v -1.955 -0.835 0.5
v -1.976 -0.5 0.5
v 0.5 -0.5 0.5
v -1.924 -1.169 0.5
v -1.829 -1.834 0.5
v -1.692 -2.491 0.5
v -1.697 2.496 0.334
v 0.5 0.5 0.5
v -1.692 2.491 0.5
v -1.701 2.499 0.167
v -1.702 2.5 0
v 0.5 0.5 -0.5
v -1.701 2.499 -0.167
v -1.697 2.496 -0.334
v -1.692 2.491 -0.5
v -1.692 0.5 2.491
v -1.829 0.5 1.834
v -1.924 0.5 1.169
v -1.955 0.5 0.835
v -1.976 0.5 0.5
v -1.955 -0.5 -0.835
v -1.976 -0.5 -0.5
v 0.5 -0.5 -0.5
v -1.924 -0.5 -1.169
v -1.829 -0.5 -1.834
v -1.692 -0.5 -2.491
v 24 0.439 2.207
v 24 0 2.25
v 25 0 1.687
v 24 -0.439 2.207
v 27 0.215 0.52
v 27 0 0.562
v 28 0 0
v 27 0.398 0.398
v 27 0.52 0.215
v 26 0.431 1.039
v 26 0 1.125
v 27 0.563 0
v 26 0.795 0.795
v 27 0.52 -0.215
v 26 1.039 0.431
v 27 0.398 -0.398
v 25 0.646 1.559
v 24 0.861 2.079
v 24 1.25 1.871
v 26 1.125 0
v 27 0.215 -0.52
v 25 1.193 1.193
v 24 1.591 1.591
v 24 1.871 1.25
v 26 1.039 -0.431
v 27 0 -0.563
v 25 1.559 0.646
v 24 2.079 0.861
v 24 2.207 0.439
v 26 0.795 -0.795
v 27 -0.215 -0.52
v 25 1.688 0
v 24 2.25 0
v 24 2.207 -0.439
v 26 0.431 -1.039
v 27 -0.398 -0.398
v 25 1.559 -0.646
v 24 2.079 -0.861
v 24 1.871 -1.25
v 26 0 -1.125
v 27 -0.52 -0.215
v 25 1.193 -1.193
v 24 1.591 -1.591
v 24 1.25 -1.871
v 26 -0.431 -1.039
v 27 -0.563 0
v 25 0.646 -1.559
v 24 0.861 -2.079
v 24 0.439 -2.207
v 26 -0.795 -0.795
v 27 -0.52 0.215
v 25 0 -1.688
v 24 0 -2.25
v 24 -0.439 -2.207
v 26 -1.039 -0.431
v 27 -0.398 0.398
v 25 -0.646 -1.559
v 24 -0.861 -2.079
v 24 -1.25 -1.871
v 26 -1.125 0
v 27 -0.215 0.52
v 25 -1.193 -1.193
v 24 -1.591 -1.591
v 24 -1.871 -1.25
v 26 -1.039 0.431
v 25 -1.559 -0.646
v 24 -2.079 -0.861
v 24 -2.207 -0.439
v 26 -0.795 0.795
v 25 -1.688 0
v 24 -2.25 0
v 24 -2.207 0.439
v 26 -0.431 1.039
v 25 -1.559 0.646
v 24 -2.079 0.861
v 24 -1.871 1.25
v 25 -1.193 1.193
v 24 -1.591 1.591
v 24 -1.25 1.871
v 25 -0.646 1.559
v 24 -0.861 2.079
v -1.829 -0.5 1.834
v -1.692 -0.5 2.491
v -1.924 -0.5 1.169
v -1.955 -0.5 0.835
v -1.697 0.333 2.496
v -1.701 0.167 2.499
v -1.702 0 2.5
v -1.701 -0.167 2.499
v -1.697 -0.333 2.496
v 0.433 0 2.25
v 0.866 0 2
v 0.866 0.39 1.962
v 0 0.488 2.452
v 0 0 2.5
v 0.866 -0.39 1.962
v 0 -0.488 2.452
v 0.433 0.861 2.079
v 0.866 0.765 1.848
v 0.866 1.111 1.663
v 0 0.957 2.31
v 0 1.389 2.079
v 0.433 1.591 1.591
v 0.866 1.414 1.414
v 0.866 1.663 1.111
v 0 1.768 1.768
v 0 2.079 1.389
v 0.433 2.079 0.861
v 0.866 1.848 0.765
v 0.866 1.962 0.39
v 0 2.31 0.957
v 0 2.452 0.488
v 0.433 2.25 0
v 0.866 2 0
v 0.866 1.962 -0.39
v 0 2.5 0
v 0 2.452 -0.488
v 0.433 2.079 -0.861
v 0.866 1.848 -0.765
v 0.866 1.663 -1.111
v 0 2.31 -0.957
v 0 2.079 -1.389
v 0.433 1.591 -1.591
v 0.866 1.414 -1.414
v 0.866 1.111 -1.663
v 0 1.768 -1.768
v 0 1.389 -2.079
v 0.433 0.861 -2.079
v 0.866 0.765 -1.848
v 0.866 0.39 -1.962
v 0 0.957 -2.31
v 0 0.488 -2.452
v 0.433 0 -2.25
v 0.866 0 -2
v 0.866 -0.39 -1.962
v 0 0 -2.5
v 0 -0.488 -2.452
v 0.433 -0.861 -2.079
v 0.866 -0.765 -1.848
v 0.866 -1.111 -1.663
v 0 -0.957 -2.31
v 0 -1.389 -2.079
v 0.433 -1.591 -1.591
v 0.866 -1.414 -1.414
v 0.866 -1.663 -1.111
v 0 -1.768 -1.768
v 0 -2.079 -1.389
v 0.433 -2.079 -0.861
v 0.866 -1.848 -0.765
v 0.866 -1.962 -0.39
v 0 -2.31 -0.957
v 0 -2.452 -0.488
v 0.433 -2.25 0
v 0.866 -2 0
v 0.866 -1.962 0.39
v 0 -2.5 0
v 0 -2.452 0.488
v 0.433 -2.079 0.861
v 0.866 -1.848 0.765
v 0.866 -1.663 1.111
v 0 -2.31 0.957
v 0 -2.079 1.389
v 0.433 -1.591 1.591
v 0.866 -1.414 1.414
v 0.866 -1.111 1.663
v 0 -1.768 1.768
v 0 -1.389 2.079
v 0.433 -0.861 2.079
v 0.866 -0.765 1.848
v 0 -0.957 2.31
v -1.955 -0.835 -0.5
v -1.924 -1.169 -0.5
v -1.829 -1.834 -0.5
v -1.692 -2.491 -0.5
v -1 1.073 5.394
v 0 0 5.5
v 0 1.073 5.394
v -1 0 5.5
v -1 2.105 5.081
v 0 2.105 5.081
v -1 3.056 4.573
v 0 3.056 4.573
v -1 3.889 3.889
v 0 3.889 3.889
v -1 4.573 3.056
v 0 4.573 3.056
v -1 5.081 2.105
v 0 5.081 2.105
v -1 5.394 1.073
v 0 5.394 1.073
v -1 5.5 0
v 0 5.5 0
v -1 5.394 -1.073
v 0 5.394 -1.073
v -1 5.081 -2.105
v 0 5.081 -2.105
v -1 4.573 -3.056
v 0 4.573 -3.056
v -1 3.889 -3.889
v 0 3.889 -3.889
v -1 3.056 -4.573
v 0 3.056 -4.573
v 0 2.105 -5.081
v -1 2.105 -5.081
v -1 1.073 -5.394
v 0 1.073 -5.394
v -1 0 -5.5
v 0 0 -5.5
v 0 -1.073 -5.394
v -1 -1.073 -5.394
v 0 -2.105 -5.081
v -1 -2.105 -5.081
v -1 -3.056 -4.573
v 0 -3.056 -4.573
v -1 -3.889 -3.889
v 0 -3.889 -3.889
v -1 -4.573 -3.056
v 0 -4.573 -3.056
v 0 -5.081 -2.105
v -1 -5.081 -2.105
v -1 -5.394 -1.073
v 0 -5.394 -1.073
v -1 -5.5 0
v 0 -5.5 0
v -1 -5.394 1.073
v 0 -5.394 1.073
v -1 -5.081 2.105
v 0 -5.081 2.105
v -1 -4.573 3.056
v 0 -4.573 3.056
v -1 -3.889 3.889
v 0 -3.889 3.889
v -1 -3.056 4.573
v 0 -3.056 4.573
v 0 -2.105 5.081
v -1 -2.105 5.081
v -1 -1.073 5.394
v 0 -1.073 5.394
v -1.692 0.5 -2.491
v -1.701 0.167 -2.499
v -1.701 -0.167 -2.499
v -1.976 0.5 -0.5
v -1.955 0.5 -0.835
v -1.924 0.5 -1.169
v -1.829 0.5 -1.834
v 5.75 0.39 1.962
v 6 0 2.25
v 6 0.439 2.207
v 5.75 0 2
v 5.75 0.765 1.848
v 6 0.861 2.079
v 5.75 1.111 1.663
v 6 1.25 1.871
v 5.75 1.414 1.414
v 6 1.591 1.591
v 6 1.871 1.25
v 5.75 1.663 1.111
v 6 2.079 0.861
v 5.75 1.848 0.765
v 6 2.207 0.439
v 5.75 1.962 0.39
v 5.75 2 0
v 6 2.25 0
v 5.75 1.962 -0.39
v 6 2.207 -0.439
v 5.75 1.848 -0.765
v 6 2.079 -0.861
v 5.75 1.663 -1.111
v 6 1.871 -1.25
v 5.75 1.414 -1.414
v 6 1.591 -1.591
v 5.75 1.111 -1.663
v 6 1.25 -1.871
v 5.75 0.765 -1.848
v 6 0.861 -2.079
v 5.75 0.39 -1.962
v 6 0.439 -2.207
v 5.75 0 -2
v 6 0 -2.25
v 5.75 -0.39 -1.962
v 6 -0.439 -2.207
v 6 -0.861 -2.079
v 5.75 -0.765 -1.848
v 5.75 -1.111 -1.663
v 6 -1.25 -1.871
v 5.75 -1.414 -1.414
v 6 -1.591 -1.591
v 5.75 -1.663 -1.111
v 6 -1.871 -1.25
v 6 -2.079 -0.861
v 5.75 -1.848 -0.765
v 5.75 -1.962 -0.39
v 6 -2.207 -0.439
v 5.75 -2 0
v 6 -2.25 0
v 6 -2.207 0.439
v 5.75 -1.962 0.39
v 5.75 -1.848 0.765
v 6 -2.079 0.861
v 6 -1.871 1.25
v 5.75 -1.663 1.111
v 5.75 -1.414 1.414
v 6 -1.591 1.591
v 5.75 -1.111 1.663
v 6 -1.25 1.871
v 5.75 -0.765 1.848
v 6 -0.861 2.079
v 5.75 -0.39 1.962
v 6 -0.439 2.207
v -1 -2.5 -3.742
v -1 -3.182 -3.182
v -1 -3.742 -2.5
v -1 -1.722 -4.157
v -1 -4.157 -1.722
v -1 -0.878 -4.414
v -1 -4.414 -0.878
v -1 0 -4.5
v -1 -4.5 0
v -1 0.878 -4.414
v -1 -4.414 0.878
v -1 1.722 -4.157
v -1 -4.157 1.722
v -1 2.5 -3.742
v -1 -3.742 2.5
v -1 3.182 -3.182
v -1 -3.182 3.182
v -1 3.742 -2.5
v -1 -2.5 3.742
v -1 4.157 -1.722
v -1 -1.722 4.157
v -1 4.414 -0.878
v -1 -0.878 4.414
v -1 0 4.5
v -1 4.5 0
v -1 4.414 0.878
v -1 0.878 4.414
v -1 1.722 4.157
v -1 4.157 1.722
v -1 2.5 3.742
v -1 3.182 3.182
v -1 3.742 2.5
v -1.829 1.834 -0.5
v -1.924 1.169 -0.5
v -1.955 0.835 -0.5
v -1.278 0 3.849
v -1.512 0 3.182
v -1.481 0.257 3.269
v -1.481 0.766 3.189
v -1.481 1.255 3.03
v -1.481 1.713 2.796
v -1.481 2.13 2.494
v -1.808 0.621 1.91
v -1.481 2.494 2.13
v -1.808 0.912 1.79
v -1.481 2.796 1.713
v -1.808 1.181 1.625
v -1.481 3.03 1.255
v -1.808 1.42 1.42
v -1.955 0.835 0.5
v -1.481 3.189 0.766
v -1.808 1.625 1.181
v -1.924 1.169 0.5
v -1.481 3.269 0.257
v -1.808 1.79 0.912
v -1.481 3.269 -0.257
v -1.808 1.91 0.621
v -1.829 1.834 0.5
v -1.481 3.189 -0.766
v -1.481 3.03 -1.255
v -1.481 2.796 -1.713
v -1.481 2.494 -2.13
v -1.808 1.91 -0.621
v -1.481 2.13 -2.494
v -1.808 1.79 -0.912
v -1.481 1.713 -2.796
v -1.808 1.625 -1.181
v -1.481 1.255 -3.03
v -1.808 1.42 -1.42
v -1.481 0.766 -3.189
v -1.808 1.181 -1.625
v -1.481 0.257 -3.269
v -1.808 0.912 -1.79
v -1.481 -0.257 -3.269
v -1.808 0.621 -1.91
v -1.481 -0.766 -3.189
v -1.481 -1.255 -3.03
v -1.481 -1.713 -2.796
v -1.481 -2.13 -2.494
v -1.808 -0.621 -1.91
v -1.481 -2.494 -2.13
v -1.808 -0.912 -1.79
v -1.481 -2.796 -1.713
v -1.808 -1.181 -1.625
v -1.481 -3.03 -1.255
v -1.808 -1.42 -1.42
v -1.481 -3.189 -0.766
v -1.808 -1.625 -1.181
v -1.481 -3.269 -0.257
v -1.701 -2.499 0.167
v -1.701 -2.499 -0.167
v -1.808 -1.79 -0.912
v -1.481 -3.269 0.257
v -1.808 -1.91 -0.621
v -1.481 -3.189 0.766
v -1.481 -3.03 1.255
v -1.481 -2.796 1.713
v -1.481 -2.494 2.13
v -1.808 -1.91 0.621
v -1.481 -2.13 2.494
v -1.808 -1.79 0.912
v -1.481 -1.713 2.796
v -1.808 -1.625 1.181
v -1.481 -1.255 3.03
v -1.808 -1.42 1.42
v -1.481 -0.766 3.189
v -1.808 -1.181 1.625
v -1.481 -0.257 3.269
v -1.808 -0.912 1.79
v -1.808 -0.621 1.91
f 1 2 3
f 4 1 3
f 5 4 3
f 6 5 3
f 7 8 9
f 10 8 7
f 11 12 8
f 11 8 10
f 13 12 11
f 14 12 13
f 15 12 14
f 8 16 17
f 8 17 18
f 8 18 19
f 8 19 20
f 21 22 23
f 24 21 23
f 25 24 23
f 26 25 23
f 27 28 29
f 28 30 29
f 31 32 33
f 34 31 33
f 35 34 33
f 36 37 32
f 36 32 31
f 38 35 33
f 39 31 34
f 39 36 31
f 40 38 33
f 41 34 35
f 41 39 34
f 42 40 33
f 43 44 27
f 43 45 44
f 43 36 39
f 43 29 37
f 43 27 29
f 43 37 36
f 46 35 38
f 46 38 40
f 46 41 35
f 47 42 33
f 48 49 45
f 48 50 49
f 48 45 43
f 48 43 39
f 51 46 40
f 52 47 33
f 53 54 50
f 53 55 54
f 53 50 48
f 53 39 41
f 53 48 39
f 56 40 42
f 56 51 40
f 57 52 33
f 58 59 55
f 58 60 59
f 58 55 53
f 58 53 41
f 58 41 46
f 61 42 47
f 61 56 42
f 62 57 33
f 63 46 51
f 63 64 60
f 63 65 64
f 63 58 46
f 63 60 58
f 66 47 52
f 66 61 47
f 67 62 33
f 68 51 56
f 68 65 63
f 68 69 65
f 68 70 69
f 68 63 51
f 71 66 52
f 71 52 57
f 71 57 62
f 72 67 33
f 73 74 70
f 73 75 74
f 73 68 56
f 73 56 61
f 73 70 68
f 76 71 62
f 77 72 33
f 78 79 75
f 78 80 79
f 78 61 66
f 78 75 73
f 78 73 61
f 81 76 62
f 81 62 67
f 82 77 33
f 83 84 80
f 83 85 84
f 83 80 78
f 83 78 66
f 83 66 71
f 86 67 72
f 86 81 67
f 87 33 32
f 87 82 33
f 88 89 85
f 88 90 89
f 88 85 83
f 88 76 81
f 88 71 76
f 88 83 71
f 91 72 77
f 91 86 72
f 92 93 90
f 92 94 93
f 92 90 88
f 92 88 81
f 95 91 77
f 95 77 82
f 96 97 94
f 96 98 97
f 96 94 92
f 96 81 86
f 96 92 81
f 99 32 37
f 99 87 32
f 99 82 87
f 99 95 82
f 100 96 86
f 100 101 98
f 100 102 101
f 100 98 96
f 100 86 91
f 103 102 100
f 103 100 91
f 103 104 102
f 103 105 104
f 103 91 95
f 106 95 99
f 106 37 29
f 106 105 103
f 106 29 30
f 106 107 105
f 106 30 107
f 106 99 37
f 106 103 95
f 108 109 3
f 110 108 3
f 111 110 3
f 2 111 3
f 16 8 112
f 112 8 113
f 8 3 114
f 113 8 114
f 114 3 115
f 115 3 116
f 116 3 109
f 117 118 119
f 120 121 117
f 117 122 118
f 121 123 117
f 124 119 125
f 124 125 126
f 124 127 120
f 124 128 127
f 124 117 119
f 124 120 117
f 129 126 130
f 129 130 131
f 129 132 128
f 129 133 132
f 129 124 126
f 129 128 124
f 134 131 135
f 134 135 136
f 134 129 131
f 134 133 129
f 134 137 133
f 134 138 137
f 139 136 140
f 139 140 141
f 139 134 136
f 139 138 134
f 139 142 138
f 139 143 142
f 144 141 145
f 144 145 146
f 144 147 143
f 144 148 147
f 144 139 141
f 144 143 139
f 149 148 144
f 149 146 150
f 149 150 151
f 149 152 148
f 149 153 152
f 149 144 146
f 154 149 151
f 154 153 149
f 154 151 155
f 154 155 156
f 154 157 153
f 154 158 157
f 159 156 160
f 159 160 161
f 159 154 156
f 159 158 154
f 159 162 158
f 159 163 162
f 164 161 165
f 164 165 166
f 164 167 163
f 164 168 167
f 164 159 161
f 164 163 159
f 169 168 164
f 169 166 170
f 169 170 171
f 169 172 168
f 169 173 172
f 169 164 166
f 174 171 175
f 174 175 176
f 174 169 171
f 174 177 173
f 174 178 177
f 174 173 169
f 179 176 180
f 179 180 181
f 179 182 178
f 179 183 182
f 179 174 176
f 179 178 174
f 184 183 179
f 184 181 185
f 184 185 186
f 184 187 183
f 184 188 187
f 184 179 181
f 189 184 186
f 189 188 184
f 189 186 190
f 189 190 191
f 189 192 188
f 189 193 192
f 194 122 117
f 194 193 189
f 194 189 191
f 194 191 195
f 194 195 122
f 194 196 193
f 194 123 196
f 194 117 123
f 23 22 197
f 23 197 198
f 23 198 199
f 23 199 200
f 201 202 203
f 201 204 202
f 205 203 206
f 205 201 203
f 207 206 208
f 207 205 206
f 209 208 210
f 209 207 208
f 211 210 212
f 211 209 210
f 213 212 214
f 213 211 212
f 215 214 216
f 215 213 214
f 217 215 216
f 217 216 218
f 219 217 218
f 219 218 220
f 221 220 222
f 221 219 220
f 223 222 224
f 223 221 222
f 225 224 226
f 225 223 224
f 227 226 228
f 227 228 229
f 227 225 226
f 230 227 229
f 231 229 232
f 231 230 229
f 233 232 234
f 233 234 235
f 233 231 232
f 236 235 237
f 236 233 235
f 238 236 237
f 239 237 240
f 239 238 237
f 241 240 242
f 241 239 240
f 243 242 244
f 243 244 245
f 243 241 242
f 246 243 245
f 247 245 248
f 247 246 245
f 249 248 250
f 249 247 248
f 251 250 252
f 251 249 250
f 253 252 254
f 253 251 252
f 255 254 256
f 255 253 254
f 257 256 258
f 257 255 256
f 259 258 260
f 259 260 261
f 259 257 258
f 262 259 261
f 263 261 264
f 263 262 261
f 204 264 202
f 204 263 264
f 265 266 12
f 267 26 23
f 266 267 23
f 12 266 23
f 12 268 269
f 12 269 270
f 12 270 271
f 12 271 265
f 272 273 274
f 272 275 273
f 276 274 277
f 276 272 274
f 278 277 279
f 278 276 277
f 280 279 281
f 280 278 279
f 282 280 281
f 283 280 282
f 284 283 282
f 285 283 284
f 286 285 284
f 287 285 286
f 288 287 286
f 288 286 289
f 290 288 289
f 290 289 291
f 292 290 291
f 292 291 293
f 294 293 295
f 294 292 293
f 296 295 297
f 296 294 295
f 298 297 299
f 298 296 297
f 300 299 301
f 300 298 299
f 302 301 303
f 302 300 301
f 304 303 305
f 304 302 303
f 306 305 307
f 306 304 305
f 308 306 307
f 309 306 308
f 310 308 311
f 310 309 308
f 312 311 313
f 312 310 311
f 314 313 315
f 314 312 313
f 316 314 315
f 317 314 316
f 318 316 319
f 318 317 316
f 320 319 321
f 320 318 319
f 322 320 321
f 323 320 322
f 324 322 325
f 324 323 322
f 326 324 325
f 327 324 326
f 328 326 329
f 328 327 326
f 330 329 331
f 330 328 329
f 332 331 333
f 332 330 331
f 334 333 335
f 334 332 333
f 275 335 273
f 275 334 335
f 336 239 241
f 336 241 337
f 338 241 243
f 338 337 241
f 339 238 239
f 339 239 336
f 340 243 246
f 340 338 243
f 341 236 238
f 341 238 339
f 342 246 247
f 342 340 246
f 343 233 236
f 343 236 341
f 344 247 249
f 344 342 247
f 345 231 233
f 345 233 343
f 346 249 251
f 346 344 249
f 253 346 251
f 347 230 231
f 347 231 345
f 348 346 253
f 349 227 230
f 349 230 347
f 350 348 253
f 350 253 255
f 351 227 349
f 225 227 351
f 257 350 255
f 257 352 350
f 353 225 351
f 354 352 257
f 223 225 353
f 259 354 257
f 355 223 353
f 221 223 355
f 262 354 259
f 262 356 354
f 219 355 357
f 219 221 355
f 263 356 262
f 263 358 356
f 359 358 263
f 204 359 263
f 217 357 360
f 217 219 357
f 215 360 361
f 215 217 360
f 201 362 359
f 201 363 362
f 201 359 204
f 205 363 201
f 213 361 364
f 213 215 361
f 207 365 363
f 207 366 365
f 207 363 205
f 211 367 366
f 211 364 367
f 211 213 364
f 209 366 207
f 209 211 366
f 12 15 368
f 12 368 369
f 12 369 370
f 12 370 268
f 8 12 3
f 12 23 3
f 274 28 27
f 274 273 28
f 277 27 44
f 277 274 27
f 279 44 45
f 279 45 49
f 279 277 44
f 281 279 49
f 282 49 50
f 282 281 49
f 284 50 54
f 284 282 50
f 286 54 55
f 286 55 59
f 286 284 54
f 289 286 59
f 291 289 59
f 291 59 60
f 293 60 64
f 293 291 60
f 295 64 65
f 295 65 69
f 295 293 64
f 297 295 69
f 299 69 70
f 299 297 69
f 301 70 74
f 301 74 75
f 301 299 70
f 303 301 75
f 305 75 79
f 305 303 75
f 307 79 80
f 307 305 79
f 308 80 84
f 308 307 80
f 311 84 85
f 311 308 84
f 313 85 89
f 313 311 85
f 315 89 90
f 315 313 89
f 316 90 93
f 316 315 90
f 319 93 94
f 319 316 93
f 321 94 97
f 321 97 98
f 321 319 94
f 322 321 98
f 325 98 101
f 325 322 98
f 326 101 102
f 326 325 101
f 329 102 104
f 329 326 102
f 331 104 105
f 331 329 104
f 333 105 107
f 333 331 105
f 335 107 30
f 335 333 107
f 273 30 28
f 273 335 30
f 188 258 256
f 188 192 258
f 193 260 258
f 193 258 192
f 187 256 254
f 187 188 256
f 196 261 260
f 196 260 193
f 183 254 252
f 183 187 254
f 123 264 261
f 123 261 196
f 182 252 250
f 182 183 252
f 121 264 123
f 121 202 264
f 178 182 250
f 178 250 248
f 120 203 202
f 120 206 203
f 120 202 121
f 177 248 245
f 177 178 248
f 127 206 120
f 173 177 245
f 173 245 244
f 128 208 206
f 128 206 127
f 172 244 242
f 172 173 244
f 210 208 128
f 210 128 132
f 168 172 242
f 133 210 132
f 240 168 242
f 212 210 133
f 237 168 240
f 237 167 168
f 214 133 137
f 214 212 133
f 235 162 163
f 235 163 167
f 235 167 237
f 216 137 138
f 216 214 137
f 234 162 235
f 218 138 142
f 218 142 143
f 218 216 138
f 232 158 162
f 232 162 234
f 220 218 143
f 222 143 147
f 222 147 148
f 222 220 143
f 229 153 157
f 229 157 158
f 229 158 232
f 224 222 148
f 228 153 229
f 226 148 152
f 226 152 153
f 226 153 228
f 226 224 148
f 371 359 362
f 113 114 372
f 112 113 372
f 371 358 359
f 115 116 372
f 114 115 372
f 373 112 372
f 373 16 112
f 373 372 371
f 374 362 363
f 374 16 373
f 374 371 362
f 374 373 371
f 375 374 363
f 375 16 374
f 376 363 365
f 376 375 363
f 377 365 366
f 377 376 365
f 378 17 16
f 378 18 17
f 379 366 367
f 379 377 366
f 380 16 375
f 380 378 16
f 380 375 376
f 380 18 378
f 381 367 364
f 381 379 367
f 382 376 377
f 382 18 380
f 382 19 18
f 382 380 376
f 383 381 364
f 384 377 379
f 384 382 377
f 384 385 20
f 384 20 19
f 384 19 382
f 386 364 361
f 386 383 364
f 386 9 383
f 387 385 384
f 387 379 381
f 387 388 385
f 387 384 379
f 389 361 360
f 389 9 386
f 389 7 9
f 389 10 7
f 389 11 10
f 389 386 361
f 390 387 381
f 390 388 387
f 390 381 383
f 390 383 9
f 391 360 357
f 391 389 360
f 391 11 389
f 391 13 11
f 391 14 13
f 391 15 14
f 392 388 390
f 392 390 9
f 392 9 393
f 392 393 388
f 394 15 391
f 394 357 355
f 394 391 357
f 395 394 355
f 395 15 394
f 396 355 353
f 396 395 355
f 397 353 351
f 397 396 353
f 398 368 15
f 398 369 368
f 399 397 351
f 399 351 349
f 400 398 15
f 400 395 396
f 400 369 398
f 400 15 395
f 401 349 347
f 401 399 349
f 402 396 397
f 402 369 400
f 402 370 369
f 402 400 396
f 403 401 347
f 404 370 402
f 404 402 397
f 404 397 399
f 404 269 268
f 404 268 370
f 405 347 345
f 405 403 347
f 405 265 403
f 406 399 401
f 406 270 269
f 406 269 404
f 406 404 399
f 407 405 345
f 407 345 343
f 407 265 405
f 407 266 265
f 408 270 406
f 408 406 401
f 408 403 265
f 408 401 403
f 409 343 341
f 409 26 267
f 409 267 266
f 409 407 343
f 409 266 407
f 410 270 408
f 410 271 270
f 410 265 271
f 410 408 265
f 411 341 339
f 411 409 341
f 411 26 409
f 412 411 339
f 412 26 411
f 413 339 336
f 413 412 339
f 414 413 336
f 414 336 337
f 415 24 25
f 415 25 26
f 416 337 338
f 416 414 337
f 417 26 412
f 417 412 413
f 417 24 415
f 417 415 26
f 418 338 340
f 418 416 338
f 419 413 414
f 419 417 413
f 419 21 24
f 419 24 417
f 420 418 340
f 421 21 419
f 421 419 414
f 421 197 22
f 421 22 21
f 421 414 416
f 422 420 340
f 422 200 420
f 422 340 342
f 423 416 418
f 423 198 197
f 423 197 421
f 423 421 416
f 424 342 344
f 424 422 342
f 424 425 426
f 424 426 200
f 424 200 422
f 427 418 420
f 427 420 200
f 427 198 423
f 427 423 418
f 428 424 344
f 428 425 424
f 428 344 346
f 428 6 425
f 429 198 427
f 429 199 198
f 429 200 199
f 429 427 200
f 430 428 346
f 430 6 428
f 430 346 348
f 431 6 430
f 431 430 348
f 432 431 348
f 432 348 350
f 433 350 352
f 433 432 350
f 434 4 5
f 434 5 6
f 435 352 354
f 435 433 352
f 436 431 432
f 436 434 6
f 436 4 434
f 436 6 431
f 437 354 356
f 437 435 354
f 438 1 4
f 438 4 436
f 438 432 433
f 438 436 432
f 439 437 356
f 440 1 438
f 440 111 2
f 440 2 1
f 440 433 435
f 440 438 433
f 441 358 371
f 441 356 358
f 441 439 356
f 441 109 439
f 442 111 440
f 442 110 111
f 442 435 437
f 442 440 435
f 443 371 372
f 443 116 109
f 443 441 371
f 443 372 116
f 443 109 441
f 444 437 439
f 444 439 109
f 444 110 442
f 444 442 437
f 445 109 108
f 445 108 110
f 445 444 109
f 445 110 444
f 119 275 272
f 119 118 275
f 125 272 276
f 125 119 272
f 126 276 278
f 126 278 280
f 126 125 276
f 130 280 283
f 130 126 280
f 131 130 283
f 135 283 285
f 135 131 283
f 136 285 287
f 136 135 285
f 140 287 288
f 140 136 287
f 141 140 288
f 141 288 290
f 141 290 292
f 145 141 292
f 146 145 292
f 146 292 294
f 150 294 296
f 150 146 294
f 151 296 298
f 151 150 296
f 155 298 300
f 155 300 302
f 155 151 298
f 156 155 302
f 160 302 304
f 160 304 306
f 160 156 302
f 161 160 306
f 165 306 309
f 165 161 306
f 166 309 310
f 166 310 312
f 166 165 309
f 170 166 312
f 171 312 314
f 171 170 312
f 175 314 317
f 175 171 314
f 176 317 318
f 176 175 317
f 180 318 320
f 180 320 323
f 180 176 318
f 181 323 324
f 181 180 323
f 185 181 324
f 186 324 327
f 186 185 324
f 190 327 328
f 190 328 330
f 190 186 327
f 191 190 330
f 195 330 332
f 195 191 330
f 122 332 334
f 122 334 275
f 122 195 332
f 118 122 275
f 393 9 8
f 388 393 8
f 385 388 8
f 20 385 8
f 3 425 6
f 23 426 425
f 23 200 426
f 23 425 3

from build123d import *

# Parameters (mm, degrees)
F3_DEPTH = 0.5


# Not quite as in the source:
# - a pattern or mirror of a feature is missing from the dataset's text; its kind, count and spacing are read off the source's solid


with BuildPart() as f1:
    # F0 (on Front) → F1 (revolve)
    with BuildSketch(Plane.XZ):
        with BuildLine():
            Line((28, 0), (24, 2.25))
            Line((24, 2.25), (6, 2.25))
            Line((6, 2.25), (5.75, 2))
            Line((5.75, 2), (0.8660254038, 2))
            Line((0.8660254038, 2), (0, 2.5))
            Line((0, 2.5), (0, 5.5))
            Line((0, 5.5), (-1, 5.5))
            Line((-1, 5.5), (-1, 4.5))
            ThreePointArc((-1, 4.5), (-1.7469875145, 2.3048861143), (-2, 0))
            Line((-2, 0), (28, 0))
        make_face()
    revolve(axis=Axis((13, 0, 0), (-1, 0, 0)))

    # F2 (on Front) → F3 (cut, symmetric)
    with BuildSketch(Plane.XZ):
        Polygon((-1.7016947762, 2.5), (-2, 2.5), (-2, 0), (-2, -2.5), (-1.7016947762, -2.5), (0.5, -0.5), (0.5, 0), (0.5, 0.5), align=None)
    f3 = extrude(amount=F3_DEPTH, both=True, mode=Mode.SUBTRACT)

    # F3_copies: F3 across plane
    add(f3.mirror(Plane(origin=(0, 0, 0), x_dir=(0, -0.7071067802, -0.7071067821), z_dir=(-2.1e-09, -0.7071067821, 0.7071067802))), mode=Mode.SUBTRACT)


solid = f1.part
